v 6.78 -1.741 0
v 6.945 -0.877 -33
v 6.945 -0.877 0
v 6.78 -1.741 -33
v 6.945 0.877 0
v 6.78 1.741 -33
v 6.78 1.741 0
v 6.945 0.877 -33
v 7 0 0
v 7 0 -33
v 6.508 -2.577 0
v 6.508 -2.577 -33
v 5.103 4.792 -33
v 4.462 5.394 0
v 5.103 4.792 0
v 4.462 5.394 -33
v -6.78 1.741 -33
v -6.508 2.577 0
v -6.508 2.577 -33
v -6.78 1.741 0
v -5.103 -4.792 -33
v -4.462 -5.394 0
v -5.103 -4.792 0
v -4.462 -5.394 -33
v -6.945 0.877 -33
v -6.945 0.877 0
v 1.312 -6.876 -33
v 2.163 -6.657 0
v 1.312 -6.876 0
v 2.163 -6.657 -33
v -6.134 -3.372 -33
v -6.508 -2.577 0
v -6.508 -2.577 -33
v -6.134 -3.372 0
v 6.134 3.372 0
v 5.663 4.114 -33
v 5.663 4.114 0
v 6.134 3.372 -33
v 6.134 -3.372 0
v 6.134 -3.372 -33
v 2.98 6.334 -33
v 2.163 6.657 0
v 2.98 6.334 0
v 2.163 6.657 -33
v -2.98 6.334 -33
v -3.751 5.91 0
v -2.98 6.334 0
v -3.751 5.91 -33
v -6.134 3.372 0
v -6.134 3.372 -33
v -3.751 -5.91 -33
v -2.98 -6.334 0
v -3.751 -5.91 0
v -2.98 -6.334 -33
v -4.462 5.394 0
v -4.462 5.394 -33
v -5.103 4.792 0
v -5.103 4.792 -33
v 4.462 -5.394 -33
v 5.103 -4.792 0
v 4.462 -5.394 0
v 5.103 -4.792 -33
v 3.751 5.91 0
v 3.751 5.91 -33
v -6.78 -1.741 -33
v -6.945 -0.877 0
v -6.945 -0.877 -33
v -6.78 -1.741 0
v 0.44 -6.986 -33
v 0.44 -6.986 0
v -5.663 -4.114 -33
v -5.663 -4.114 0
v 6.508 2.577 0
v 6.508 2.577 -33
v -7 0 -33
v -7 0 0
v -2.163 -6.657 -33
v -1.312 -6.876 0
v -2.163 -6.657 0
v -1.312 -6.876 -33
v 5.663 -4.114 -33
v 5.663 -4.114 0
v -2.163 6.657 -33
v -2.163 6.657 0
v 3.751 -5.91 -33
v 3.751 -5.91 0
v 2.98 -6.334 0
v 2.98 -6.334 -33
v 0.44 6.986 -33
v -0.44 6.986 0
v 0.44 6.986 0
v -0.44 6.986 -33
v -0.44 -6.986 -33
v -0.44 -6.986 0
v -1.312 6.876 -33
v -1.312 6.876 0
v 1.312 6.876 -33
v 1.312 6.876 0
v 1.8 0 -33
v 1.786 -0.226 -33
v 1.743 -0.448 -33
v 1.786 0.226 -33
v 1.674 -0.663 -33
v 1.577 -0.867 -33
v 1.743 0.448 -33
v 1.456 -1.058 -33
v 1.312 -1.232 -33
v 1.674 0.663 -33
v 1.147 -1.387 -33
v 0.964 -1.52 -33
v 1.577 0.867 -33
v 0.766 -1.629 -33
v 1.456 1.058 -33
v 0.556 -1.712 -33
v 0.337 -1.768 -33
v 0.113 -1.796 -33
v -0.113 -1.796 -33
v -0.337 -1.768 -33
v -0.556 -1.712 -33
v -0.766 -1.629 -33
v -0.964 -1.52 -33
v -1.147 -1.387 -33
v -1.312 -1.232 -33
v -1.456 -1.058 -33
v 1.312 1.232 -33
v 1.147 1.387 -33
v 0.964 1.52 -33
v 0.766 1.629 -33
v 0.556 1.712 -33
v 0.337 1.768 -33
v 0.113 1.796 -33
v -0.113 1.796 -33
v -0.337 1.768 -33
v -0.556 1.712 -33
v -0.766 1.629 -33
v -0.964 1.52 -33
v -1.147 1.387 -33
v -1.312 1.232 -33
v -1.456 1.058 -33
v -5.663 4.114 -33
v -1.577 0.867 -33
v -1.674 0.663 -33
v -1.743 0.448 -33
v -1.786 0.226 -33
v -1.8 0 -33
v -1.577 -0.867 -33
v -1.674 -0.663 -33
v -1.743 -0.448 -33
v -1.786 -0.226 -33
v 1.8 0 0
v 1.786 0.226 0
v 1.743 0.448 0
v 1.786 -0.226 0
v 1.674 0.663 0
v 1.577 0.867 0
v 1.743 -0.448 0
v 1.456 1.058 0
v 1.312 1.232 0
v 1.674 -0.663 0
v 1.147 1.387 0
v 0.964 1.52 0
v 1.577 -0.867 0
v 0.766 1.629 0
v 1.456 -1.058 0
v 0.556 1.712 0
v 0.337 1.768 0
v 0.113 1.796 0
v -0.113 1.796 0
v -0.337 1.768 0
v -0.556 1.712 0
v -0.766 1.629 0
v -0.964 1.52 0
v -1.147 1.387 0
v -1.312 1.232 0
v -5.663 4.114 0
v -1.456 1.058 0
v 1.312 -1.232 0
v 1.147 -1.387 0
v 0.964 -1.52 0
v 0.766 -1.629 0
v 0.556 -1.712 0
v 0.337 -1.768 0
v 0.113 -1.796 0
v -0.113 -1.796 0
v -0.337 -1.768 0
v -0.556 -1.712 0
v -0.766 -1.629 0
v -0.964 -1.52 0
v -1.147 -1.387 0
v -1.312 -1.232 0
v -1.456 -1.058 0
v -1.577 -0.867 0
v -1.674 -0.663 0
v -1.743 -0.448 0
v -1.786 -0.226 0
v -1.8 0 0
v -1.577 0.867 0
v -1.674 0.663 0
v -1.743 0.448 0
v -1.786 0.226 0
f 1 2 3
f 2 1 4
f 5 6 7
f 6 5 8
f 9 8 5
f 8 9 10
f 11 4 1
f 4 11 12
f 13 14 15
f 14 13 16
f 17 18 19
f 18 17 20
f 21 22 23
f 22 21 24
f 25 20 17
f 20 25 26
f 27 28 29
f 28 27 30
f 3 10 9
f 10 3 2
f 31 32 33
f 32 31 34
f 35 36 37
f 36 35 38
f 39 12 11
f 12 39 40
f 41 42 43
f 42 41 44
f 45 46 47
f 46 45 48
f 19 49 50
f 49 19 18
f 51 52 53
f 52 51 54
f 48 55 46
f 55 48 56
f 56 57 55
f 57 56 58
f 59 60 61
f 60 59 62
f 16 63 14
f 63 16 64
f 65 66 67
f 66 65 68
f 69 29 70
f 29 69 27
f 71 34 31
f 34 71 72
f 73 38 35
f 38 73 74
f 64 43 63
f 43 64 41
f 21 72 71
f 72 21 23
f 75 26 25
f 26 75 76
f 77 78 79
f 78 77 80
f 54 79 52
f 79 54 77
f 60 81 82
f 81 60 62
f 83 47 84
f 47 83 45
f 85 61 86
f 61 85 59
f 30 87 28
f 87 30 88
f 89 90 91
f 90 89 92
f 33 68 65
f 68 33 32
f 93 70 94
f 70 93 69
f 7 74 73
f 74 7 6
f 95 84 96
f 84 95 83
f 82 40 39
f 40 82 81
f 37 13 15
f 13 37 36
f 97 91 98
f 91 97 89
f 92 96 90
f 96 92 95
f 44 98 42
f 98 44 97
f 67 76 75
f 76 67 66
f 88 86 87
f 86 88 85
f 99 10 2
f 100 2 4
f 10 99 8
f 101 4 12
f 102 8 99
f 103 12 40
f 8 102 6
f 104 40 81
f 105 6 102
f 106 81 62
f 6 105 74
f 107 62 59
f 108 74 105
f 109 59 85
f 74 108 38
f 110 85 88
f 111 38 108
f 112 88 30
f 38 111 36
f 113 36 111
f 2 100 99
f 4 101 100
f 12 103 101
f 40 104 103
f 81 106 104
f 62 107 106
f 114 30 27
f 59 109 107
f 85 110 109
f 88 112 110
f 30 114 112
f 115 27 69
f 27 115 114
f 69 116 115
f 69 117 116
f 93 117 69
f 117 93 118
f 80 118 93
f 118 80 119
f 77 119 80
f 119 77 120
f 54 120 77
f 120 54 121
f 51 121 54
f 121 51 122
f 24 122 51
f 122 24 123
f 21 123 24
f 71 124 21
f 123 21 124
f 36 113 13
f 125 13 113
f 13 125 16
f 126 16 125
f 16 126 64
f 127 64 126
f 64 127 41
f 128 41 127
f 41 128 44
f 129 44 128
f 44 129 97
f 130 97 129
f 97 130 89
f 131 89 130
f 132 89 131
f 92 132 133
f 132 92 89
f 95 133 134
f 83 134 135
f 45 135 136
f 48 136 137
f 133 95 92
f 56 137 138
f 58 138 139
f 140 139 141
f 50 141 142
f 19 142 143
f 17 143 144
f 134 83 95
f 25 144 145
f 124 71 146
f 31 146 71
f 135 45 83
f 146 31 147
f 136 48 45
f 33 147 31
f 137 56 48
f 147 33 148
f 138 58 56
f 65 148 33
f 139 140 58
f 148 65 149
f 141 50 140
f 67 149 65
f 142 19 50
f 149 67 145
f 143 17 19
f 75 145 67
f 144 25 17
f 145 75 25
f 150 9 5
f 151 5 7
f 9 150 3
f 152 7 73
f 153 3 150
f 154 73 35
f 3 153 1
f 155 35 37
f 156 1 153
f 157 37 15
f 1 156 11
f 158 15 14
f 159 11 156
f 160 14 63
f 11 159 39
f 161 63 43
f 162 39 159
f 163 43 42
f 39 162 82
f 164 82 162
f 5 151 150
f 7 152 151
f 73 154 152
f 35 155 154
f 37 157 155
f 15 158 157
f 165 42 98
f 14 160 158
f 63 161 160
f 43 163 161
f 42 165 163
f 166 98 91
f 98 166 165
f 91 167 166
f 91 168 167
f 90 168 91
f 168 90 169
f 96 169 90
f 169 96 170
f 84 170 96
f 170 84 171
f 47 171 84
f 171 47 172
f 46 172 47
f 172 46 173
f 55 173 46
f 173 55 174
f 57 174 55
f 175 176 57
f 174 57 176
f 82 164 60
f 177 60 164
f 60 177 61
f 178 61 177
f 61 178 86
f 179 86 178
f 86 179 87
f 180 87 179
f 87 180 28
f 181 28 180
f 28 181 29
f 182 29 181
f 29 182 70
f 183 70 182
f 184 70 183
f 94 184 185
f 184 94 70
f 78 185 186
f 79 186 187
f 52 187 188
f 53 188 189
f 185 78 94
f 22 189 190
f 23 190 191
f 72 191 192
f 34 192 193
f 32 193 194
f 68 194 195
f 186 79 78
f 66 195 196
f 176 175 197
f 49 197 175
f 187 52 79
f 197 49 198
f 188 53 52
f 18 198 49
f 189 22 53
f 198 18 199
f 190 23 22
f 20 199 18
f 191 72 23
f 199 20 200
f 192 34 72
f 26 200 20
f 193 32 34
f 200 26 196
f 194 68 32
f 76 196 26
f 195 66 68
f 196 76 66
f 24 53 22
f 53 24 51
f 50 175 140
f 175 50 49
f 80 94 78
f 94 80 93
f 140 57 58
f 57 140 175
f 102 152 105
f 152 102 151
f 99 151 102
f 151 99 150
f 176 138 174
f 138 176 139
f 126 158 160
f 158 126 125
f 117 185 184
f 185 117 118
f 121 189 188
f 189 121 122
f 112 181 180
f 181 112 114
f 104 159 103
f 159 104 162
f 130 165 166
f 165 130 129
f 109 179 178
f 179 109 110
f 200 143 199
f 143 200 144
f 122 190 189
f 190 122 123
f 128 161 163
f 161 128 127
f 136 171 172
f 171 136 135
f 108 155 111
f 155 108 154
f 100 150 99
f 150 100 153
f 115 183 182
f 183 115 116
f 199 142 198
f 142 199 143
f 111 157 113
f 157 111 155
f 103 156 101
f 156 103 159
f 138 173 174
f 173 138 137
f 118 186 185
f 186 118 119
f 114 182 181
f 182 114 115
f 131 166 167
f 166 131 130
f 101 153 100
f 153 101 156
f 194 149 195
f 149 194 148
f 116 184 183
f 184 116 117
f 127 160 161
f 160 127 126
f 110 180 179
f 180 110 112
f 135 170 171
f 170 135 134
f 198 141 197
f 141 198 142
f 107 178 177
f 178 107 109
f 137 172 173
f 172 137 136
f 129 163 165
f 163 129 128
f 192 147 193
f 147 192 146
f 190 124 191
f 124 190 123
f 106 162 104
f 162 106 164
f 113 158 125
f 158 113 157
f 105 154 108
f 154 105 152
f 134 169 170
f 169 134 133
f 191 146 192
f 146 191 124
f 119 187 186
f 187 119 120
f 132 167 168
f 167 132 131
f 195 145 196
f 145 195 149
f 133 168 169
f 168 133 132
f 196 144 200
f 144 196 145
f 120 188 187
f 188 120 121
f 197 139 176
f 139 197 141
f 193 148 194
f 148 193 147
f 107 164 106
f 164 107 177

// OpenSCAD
$fn = 50;


difference() {
	union() {
		translate(v = [0, 0, -33.0000000000]) {
			cylinder(h = 33, r = 7.0000000000);
		}
		cylinder(h = 0, r = 13.0000000000);
	}
	union() {
		#translate(v = [0, 0, -33]) {
			cylinder(h = 33, r = 1.8000000000);
		}
	}
}
